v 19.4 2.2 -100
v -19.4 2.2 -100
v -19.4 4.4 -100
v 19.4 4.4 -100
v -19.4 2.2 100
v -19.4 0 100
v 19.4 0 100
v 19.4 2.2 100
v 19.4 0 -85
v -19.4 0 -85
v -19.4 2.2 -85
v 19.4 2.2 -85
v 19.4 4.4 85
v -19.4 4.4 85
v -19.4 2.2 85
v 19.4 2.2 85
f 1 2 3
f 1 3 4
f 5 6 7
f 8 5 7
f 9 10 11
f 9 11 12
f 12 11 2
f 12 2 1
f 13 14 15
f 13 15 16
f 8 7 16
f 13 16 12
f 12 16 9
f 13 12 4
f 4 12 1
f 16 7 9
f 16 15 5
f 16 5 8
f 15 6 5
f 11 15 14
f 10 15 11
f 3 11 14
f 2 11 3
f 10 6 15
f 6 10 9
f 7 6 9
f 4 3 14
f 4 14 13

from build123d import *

# Parameters (mm, degrees)
SKETCH_1_W          = 38.8
SKETCH_1_H          = 200
EXTRUDE_1_DEPTH     = 4.4
SKETCH_2_W          = 38.8
SKETCH_2_H          = 15
CUT_EXTRUDE_1_DEPTH = 2.2
SKETCH_3_W          = 38.8
SKETCH_3_H          = 15
CUT_EXTRUDE_2_DEPTH = 2.2


with BuildPart() as part:
    # 草圖1 → 填料-伸長1 (new body)
    with BuildSketch(Plane(origin=(0, 0, 0), x_dir=(1, 0, 0), z_dir=(0, 1, 0))):
        Rectangle(SKETCH_1_W, SKETCH_1_H)
    extrude(amount=EXTRUDE_1_DEPTH)

    # 草圖2 → 除料-伸長1 (cut)
    with BuildSketch(Plane(origin=(0, 4.4, 0), x_dir=(1, 0, 0), z_dir=(0, 1, 0))):
        with Locations((0, -92.5)):
            Rectangle(SKETCH_2_W, SKETCH_2_H)
    extrude(amount=-CUT_EXTRUDE_1_DEPTH, mode=Mode.SUBTRACT)

    # 草圖3 → 除料-伸長2 (cut)
    with BuildSketch(Plane.XZ):
        with Locations((0, -92.5)):
            Rectangle(SKETCH_3_W, SKETCH_3_H)
    extrude(amount=-CUT_EXTRUDE_2_DEPTH, mode=Mode.SUBTRACT)


solid = part.part
